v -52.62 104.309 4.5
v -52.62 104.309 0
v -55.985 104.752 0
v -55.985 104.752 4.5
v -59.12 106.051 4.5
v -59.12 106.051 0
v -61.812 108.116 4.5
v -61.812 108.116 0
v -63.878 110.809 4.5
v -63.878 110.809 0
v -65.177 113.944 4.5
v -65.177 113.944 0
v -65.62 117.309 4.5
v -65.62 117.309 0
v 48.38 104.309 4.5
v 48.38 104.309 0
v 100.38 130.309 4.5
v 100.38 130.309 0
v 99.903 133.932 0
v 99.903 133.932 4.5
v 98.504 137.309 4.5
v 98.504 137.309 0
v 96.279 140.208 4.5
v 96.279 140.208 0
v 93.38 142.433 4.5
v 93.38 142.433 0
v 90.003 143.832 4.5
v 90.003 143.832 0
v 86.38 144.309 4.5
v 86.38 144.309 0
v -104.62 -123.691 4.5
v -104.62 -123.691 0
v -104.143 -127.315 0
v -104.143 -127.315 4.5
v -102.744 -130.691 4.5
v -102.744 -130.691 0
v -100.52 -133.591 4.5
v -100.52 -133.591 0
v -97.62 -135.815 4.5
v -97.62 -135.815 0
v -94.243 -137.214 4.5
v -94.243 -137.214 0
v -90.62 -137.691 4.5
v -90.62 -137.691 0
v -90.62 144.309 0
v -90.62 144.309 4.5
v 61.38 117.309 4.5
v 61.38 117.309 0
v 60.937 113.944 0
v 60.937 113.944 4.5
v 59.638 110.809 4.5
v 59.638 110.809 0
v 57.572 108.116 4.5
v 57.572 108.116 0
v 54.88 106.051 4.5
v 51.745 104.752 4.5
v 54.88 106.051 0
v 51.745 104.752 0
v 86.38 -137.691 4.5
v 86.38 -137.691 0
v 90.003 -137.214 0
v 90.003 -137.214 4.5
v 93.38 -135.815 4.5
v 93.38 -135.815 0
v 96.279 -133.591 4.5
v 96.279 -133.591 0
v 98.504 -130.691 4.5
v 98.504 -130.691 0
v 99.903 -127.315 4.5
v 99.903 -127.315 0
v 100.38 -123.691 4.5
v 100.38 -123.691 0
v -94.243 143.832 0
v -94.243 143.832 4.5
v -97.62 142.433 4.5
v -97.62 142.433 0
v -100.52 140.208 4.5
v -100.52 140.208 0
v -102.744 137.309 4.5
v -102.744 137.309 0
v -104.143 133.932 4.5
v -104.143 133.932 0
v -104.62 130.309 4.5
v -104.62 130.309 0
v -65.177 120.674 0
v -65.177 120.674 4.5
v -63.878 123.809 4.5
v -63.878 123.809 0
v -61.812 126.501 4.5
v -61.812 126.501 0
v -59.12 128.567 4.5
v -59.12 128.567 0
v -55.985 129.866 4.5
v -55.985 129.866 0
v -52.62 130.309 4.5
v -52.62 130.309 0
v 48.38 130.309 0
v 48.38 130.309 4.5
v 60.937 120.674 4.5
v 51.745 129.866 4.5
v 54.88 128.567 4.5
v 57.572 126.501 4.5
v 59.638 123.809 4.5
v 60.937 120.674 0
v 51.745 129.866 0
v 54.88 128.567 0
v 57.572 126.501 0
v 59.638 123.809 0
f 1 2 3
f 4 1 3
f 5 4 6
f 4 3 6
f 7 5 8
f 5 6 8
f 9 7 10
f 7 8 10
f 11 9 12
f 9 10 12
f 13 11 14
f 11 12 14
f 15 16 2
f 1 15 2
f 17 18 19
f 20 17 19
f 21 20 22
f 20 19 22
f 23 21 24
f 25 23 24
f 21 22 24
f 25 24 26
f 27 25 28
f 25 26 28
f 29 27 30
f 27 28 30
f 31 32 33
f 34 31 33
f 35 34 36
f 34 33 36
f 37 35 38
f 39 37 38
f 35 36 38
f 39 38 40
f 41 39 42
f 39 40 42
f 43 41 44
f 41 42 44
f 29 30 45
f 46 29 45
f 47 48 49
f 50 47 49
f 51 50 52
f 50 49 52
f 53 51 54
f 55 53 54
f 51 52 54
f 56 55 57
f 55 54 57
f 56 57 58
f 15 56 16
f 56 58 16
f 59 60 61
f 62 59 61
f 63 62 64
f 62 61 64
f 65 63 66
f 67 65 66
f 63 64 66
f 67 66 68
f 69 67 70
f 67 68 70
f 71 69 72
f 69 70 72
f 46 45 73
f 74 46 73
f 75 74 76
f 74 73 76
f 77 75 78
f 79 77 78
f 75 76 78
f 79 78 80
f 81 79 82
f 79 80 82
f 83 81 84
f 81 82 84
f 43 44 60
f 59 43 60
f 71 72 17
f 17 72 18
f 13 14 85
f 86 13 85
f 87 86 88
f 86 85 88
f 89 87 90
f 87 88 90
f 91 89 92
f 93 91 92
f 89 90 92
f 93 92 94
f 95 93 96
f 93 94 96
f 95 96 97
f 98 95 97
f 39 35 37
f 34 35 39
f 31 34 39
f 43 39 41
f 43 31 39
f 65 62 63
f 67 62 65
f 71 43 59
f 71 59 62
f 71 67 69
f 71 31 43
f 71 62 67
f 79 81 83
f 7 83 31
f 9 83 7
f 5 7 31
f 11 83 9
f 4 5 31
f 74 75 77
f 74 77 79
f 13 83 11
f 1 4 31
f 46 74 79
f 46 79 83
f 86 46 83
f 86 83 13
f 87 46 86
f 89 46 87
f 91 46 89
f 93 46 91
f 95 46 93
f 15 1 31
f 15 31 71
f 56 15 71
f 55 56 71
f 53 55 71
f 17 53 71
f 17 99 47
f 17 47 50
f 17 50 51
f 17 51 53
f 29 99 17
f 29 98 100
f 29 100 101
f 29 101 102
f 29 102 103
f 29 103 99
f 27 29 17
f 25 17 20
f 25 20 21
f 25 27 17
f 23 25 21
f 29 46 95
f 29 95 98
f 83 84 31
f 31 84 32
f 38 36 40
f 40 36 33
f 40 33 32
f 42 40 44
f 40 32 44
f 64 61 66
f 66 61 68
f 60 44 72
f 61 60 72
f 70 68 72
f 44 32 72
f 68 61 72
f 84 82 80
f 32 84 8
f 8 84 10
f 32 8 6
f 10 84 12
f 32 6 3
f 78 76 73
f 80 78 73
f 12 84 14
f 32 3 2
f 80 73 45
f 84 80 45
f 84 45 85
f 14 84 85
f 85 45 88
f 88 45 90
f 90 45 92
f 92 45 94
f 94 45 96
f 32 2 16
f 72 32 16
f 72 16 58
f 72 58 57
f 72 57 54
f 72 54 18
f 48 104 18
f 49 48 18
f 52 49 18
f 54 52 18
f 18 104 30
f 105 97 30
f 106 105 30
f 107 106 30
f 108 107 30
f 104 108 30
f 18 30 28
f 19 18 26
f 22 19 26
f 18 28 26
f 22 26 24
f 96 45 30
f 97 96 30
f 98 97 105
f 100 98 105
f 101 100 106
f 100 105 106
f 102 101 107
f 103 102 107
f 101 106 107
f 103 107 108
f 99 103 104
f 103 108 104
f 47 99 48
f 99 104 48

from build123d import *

# Parameters (mm, degrees)
F1_DEPTH = 4.5


with BuildPart() as f1:
    # F0 (on Top) → F1 (new body)
    with BuildSketch(Plane.XY):
        with BuildLine():
            Line((86.379995, 144.308884), (-90.620005, 144.308884))
            ThreePointArc((-90.620005, 144.308884), (-100.5195, 140.208379), (-104.620005, 130.308884))
            Line((-104.620005, 130.308884), (-104.620005, -123.691116))
            ThreePointArc((-104.620005, -123.691116), (-100.5195, -133.590611), (-90.620005, -137.691116))
            Line((-90.620005, -137.691116), (86.379995, -137.691116))
            ThreePointArc((86.379995, -137.691116), (96.27949, -133.590611), (100.379995, -123.691116))
            Line((100.379995, -123.691116), (100.379995, 130.308884))
            ThreePointArc((100.379995, 130.308884), (96.27949, 140.208379), (86.379995, 144.308884))
        make_face()
        with BuildLine():
            ThreePointArc((-65.620005, 117.308884), (-61.812393, 126.501272), (-52.620005, 130.308884))
            Line((-52.620005, 130.308884), (48.379995, 130.308884))
            ThreePointArc((48.379995, 130.308884), (57.572383, 126.501272), (61.379995, 117.308884))
            ThreePointArc((61.379995, 117.308884), (57.572383, 108.116496), (48.379995, 104.308884))
            Line((48.379995, 104.308884), (-52.620005, 104.308884))
            ThreePointArc((-52.620005, 104.308884), (-61.812393, 108.116496), (-65.620005, 117.308884))
        make_face(mode=Mode.SUBTRACT)
    extrude(amount=F1_DEPTH)


solid = f1.part
